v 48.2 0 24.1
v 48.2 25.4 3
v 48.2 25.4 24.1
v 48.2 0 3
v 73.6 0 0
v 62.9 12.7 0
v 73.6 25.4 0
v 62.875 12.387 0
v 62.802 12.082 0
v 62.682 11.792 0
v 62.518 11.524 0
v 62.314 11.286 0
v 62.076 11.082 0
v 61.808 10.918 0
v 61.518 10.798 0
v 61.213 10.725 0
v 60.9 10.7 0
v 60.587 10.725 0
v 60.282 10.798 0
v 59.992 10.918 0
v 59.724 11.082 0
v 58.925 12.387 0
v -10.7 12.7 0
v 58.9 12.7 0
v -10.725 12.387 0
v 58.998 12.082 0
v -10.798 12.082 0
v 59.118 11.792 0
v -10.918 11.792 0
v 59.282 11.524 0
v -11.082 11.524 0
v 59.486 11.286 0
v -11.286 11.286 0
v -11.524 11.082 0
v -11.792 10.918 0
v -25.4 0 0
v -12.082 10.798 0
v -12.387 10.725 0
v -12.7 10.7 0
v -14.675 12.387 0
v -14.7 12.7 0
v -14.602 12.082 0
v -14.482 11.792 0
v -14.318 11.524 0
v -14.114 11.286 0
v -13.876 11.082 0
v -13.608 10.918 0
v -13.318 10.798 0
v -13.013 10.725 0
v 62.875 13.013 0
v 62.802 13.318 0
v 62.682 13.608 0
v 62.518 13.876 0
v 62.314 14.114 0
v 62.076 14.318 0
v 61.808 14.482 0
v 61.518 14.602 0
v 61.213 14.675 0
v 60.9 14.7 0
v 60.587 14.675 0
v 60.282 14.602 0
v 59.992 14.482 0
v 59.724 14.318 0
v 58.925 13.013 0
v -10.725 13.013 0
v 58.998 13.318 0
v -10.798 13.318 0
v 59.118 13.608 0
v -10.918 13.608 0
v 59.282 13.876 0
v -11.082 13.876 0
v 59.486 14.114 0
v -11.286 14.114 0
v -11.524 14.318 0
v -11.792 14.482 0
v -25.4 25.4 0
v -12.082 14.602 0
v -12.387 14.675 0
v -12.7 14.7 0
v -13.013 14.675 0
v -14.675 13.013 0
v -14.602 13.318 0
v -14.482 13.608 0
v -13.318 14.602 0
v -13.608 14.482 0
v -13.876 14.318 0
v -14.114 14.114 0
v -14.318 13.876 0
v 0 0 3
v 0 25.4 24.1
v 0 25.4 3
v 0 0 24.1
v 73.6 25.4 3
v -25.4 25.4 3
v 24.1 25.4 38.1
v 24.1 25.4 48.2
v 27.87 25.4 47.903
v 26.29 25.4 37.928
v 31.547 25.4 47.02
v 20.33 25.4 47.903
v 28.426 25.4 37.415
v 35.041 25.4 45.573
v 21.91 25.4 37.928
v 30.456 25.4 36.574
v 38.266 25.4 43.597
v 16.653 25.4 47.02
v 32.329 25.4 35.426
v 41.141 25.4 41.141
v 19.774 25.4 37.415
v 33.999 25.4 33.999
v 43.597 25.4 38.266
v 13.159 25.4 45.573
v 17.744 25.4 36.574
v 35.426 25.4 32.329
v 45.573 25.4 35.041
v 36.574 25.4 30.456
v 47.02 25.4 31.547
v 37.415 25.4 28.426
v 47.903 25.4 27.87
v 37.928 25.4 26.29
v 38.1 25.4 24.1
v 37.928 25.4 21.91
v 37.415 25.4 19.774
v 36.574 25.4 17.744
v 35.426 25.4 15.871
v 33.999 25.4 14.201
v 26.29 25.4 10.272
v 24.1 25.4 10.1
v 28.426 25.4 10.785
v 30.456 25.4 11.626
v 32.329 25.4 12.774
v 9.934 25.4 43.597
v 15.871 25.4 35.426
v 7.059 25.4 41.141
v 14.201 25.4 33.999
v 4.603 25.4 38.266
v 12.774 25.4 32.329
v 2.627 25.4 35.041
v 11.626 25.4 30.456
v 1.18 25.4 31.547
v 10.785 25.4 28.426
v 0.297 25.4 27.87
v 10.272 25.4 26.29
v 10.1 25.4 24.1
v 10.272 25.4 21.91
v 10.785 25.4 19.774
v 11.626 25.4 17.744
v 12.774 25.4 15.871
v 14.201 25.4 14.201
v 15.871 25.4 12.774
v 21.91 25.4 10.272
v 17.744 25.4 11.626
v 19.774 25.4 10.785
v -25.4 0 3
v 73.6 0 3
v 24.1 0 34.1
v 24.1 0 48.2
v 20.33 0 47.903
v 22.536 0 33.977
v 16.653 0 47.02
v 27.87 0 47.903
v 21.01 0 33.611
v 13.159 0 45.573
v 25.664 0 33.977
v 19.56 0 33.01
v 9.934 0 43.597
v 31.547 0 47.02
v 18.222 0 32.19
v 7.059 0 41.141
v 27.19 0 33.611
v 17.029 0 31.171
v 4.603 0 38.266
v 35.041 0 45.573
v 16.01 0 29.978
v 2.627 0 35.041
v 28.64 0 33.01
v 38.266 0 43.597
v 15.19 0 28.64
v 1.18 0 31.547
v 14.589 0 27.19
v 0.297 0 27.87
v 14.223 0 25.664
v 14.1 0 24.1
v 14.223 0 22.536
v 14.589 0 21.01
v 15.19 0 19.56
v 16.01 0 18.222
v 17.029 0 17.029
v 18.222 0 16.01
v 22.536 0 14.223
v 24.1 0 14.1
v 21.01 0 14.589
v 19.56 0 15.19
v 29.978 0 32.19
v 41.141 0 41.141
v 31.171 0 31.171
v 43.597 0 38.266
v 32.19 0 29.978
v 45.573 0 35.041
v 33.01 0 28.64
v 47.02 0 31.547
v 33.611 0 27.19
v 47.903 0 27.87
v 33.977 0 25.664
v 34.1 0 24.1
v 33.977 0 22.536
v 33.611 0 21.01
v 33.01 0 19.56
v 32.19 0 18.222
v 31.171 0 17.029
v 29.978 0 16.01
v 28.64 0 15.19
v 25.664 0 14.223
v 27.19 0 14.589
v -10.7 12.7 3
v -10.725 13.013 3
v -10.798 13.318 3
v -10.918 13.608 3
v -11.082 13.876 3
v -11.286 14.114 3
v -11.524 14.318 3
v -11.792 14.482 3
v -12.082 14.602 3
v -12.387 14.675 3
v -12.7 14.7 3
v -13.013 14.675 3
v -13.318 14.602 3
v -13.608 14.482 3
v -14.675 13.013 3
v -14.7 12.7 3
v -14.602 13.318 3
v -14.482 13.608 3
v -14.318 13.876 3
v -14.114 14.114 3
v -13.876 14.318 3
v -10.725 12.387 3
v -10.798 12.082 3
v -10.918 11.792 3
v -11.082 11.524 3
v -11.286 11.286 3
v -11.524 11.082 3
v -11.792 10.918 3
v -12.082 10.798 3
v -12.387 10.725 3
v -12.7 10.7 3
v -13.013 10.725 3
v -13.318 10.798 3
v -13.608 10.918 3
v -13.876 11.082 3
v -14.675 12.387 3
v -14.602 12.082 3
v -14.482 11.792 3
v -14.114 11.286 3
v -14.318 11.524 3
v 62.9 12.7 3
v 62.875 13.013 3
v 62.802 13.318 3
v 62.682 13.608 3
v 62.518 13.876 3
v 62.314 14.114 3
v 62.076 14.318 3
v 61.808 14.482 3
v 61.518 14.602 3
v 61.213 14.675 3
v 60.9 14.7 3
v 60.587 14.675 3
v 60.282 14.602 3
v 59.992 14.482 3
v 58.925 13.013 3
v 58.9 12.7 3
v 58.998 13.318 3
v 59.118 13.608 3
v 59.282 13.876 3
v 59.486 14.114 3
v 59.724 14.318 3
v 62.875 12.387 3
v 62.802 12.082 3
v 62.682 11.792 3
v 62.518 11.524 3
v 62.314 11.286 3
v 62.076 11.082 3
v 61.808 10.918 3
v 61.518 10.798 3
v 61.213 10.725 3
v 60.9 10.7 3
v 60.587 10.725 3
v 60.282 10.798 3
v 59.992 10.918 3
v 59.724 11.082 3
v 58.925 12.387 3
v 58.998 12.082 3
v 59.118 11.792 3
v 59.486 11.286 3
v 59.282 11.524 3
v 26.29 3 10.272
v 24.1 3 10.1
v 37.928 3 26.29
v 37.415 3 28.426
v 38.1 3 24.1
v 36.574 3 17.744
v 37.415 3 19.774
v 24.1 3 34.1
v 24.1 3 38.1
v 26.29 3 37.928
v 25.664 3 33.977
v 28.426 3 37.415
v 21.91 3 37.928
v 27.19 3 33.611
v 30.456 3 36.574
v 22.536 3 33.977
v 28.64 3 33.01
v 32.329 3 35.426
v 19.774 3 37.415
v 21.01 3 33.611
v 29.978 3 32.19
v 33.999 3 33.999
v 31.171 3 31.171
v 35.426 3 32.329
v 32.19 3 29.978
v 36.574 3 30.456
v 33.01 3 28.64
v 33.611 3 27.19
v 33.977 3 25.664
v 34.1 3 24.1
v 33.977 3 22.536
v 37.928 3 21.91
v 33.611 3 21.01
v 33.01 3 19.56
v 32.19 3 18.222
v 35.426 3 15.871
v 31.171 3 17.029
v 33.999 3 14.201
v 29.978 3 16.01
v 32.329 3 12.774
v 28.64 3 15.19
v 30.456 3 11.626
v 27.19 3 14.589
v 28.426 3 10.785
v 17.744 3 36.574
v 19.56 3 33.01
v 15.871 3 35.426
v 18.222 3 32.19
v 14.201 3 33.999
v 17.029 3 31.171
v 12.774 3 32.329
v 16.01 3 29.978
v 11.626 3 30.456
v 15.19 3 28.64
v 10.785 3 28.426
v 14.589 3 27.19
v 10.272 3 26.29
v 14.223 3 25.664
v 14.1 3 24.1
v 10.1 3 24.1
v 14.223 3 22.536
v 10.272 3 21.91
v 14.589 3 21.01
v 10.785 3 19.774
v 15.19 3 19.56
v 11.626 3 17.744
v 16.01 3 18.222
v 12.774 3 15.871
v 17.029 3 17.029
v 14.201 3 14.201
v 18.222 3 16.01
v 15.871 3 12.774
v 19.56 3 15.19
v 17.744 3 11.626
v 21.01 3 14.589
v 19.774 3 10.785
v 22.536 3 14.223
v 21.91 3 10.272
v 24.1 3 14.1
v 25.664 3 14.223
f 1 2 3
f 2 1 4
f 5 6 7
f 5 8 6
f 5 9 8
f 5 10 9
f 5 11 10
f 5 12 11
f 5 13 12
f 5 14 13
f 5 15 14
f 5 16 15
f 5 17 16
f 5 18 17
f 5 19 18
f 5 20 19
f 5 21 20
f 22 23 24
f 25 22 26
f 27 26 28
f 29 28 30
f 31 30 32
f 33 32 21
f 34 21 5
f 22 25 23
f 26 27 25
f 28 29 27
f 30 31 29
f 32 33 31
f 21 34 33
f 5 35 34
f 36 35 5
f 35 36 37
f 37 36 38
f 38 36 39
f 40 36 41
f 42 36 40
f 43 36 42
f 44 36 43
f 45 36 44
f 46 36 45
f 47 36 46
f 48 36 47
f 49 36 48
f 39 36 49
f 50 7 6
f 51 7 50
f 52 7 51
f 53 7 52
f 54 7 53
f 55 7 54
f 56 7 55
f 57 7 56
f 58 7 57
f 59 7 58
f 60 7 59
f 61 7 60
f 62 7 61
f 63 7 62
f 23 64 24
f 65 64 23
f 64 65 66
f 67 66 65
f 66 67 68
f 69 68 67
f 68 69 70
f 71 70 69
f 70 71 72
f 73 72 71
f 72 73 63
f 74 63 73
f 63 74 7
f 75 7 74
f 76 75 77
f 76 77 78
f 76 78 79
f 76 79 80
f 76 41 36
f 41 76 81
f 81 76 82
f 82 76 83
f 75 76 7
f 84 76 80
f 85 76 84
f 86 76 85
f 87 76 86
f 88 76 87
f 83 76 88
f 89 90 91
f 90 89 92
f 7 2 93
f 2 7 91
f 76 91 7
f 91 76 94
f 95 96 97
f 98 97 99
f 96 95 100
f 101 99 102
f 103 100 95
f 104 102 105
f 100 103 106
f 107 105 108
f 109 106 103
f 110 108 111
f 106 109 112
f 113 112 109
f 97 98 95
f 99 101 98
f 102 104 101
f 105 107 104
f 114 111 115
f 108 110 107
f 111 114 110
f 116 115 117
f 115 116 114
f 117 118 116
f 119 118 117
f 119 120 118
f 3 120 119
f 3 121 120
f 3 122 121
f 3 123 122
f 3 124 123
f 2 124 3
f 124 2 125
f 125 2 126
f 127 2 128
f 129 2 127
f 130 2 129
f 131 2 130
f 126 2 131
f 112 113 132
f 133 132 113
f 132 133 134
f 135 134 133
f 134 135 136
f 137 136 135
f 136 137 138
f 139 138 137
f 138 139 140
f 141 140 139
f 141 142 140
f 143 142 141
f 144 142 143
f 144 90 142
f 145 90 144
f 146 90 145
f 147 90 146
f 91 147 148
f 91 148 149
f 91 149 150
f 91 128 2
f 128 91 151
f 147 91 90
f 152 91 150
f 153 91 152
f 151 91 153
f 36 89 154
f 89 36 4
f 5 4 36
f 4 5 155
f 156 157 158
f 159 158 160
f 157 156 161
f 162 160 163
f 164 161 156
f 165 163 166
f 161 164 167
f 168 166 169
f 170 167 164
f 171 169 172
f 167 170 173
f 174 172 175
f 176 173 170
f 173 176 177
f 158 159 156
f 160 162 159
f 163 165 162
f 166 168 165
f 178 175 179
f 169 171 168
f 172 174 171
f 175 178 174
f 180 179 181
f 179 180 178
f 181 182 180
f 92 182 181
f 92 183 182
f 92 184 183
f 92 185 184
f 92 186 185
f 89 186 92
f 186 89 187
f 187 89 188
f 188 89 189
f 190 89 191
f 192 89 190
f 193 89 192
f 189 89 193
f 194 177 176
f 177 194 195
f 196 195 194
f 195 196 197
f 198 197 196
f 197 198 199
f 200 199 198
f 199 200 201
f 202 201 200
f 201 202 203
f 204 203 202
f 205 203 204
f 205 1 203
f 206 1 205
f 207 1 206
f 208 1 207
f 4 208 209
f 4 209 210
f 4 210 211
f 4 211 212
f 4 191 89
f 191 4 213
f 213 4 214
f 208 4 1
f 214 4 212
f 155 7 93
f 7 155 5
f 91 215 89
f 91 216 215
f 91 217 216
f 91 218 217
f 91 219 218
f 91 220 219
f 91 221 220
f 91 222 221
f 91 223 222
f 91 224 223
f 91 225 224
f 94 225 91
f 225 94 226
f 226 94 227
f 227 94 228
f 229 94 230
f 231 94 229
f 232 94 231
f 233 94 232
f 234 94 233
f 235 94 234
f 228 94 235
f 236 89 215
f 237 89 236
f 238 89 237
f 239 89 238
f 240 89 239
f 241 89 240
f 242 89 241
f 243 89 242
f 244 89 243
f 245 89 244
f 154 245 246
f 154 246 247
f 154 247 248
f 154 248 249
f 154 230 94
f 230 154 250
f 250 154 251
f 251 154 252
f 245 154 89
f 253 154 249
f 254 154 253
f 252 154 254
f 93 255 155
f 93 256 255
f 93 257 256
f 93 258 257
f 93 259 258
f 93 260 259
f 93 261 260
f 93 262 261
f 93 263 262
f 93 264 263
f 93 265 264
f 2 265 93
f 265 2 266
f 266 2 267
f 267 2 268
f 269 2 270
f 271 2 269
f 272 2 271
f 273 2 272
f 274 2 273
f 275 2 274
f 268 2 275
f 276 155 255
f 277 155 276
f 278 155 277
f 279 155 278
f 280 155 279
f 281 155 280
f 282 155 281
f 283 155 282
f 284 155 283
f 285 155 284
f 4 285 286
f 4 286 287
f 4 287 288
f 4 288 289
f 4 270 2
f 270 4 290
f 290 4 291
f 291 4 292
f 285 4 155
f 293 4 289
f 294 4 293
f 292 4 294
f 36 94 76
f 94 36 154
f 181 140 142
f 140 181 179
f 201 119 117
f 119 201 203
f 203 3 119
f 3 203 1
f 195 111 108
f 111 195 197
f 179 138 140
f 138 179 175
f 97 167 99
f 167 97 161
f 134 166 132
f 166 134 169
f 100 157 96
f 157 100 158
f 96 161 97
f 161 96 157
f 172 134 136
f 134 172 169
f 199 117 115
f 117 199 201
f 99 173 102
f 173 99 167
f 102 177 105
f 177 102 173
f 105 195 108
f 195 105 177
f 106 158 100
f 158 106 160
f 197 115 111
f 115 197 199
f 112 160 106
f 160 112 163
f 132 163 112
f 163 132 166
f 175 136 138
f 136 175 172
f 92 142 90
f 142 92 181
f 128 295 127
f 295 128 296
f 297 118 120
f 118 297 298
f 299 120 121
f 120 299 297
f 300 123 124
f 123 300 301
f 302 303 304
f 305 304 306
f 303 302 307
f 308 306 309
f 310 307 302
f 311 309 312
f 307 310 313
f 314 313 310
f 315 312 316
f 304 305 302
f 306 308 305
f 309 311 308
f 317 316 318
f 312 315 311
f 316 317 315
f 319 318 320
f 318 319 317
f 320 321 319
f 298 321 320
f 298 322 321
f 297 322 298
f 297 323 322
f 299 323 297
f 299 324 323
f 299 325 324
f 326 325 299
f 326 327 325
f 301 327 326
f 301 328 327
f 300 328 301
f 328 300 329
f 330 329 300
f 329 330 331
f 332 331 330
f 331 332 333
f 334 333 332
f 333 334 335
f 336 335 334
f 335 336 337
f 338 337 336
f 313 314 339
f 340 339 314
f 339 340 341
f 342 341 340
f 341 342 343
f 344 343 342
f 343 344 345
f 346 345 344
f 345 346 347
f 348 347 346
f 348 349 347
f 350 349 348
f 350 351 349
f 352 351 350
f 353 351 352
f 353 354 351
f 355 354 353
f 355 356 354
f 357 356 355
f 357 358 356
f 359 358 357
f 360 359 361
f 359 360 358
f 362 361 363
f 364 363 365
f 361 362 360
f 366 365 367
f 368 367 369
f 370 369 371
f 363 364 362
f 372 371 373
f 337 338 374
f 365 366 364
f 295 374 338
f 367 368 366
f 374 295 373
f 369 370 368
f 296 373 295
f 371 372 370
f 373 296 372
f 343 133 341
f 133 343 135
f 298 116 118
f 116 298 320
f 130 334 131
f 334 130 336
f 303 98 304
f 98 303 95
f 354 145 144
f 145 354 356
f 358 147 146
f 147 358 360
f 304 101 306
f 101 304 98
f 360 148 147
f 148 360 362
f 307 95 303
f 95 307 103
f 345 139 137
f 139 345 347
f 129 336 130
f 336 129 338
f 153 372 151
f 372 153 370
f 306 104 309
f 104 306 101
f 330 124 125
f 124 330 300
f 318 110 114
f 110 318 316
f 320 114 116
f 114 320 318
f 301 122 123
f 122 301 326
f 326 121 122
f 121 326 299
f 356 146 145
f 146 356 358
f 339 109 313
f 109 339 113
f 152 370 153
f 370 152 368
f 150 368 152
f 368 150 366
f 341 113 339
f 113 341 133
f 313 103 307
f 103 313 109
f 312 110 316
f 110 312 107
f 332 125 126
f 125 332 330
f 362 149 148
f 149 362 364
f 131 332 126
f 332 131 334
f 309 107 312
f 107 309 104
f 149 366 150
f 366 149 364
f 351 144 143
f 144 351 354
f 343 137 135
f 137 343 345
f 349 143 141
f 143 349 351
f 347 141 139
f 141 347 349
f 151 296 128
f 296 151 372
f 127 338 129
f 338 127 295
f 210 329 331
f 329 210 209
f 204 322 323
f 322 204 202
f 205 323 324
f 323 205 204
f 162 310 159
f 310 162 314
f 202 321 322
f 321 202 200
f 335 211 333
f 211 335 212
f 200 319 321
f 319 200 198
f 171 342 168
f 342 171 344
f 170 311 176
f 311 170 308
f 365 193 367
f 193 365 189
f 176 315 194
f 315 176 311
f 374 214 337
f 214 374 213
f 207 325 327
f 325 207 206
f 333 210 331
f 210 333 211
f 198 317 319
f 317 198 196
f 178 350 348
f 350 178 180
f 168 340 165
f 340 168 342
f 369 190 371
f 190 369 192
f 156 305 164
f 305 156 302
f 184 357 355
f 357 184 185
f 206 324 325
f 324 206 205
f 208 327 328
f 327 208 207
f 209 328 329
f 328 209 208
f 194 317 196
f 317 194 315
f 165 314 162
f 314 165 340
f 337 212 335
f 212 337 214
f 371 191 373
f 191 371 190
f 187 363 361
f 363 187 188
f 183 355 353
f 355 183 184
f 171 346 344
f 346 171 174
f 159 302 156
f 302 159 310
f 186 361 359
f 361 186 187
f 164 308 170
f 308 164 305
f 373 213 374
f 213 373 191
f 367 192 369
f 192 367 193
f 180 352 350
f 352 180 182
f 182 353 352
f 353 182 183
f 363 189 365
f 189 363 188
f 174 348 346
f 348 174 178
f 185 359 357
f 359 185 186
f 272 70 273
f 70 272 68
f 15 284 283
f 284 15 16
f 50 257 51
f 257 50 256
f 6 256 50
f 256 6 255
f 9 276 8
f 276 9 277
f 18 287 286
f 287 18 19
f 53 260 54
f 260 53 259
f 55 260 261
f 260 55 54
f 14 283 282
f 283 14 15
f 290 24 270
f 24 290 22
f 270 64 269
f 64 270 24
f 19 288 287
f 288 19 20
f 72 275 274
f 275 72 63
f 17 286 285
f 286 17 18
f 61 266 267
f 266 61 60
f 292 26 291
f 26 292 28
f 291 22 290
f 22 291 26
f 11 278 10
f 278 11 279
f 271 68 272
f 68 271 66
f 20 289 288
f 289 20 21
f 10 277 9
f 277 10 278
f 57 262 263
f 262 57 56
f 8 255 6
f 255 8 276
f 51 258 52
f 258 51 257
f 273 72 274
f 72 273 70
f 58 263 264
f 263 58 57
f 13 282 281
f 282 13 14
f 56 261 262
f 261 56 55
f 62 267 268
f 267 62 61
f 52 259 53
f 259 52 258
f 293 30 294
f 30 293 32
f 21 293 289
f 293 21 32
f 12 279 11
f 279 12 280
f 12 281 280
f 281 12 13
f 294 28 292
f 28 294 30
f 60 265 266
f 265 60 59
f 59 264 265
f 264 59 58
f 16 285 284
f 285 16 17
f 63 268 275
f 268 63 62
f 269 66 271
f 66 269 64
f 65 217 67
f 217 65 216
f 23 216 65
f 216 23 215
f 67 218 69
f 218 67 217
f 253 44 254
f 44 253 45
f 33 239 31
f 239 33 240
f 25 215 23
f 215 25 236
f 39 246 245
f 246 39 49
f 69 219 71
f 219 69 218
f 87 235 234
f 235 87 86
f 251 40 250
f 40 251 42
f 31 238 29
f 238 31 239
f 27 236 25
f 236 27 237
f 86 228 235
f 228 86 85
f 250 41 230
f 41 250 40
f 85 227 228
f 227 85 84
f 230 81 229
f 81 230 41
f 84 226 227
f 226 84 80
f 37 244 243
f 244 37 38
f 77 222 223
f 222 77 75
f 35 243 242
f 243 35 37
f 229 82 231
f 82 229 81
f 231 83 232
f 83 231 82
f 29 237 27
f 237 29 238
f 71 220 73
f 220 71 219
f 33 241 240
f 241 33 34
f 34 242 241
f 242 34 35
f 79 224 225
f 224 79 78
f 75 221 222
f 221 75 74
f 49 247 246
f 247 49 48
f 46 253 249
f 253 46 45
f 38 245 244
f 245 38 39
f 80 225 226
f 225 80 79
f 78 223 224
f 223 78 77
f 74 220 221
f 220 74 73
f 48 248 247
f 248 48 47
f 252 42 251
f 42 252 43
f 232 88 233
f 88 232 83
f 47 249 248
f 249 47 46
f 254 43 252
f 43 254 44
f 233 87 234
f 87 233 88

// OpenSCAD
// preview[view:north west, tilt:top diagonal]
bearings_outer_radio = 14;
bearings_inner_radio = 10;
bracket_wall_width = 3;
bracket_depth = 25.4; // 1 inch
//lengths of tabs
bracket_flaps =  25.4;
bracket_bolts_diameter = 4; 
bracket_round_end = "yes"; //[yes,no]

module BearingForNemaCSG(nema_side, bearings_outer_radio, bearings_inner_radio)
{
	side = nema_side+bracket_wall_width*2;
	if (bracket_round_end=="yes")
	{

		difference()
		{
			translate( [-bracket_wall_width,-bracket_wall_width,nema_side/2]) 
				cube([side,bracket_depth,nema_side]);
	
			translate( [nema_side/2,bracket_depth/2-bracket_wall_width,nema_side/2]) 
				rotate(90,[1,0,0]) 
				{
					cylinder(r = side/2, h = bracket_depth, $fn = 40,center=true);
				}

		}
	}

	translate( [nema_side/2,bracket_depth/2,nema_side/2]) 
		rotate(90,[1,0,0]) 
		{
			cylinder(r = bearings_outer_radio, h = bracket_depth, $fn = 40,center=true);
		}

	translate( [nema_side/2,bracket_depth/2-bracket_wall_width,nema_side/2]) 
		rotate(90,[1,0,0]) 
		{
			cylinder(r = bearings_inner_radio, h = bracket_depth, $fn = 40,center=true);
		}

}


//units are in millimeters
M3 = 3.0/2.0;
nema17_side = 42.2;
nema17_bolts = 31.04;
nema17_depth = 33.8;
nema17_crown = 11;
nema17_bolt_radious = M3;

difference()
{
	union()
	{
		cube([nema17_side+bracket_wall_width*2, bracket_depth, nema17_side+bracket_wall_width*2]);

		translate([-bracket_flaps,0,0])
			cube([nema17_side+(bracket_wall_width+bracket_flaps)*2,bracket_depth,bracket_wall_width]);		
	}

	translate([bracket_wall_width + nema17_side + bracket_wall_width + bracket_flaps/2,bracket_depth/2,0])
		cylinder(r = bracket_bolts_diameter/2, h = 30, $fn = 40,center=true);

	translate([-bracket_flaps/2,bracket_depth/2,0])
		cylinder(r = bracket_bolts_diameter/2, h = 30, $fn = 40,center=true);


	translate([bracket_wall_width,bracket_wall_width,bracket_wall_width])


	BearingForNemaCSG(nema17_side, bearings_outer_radio, bearings_inner_radio);

}

	//BearingForNemaCSG(nema17_side, bearings_radio,bearings_radio/2);

